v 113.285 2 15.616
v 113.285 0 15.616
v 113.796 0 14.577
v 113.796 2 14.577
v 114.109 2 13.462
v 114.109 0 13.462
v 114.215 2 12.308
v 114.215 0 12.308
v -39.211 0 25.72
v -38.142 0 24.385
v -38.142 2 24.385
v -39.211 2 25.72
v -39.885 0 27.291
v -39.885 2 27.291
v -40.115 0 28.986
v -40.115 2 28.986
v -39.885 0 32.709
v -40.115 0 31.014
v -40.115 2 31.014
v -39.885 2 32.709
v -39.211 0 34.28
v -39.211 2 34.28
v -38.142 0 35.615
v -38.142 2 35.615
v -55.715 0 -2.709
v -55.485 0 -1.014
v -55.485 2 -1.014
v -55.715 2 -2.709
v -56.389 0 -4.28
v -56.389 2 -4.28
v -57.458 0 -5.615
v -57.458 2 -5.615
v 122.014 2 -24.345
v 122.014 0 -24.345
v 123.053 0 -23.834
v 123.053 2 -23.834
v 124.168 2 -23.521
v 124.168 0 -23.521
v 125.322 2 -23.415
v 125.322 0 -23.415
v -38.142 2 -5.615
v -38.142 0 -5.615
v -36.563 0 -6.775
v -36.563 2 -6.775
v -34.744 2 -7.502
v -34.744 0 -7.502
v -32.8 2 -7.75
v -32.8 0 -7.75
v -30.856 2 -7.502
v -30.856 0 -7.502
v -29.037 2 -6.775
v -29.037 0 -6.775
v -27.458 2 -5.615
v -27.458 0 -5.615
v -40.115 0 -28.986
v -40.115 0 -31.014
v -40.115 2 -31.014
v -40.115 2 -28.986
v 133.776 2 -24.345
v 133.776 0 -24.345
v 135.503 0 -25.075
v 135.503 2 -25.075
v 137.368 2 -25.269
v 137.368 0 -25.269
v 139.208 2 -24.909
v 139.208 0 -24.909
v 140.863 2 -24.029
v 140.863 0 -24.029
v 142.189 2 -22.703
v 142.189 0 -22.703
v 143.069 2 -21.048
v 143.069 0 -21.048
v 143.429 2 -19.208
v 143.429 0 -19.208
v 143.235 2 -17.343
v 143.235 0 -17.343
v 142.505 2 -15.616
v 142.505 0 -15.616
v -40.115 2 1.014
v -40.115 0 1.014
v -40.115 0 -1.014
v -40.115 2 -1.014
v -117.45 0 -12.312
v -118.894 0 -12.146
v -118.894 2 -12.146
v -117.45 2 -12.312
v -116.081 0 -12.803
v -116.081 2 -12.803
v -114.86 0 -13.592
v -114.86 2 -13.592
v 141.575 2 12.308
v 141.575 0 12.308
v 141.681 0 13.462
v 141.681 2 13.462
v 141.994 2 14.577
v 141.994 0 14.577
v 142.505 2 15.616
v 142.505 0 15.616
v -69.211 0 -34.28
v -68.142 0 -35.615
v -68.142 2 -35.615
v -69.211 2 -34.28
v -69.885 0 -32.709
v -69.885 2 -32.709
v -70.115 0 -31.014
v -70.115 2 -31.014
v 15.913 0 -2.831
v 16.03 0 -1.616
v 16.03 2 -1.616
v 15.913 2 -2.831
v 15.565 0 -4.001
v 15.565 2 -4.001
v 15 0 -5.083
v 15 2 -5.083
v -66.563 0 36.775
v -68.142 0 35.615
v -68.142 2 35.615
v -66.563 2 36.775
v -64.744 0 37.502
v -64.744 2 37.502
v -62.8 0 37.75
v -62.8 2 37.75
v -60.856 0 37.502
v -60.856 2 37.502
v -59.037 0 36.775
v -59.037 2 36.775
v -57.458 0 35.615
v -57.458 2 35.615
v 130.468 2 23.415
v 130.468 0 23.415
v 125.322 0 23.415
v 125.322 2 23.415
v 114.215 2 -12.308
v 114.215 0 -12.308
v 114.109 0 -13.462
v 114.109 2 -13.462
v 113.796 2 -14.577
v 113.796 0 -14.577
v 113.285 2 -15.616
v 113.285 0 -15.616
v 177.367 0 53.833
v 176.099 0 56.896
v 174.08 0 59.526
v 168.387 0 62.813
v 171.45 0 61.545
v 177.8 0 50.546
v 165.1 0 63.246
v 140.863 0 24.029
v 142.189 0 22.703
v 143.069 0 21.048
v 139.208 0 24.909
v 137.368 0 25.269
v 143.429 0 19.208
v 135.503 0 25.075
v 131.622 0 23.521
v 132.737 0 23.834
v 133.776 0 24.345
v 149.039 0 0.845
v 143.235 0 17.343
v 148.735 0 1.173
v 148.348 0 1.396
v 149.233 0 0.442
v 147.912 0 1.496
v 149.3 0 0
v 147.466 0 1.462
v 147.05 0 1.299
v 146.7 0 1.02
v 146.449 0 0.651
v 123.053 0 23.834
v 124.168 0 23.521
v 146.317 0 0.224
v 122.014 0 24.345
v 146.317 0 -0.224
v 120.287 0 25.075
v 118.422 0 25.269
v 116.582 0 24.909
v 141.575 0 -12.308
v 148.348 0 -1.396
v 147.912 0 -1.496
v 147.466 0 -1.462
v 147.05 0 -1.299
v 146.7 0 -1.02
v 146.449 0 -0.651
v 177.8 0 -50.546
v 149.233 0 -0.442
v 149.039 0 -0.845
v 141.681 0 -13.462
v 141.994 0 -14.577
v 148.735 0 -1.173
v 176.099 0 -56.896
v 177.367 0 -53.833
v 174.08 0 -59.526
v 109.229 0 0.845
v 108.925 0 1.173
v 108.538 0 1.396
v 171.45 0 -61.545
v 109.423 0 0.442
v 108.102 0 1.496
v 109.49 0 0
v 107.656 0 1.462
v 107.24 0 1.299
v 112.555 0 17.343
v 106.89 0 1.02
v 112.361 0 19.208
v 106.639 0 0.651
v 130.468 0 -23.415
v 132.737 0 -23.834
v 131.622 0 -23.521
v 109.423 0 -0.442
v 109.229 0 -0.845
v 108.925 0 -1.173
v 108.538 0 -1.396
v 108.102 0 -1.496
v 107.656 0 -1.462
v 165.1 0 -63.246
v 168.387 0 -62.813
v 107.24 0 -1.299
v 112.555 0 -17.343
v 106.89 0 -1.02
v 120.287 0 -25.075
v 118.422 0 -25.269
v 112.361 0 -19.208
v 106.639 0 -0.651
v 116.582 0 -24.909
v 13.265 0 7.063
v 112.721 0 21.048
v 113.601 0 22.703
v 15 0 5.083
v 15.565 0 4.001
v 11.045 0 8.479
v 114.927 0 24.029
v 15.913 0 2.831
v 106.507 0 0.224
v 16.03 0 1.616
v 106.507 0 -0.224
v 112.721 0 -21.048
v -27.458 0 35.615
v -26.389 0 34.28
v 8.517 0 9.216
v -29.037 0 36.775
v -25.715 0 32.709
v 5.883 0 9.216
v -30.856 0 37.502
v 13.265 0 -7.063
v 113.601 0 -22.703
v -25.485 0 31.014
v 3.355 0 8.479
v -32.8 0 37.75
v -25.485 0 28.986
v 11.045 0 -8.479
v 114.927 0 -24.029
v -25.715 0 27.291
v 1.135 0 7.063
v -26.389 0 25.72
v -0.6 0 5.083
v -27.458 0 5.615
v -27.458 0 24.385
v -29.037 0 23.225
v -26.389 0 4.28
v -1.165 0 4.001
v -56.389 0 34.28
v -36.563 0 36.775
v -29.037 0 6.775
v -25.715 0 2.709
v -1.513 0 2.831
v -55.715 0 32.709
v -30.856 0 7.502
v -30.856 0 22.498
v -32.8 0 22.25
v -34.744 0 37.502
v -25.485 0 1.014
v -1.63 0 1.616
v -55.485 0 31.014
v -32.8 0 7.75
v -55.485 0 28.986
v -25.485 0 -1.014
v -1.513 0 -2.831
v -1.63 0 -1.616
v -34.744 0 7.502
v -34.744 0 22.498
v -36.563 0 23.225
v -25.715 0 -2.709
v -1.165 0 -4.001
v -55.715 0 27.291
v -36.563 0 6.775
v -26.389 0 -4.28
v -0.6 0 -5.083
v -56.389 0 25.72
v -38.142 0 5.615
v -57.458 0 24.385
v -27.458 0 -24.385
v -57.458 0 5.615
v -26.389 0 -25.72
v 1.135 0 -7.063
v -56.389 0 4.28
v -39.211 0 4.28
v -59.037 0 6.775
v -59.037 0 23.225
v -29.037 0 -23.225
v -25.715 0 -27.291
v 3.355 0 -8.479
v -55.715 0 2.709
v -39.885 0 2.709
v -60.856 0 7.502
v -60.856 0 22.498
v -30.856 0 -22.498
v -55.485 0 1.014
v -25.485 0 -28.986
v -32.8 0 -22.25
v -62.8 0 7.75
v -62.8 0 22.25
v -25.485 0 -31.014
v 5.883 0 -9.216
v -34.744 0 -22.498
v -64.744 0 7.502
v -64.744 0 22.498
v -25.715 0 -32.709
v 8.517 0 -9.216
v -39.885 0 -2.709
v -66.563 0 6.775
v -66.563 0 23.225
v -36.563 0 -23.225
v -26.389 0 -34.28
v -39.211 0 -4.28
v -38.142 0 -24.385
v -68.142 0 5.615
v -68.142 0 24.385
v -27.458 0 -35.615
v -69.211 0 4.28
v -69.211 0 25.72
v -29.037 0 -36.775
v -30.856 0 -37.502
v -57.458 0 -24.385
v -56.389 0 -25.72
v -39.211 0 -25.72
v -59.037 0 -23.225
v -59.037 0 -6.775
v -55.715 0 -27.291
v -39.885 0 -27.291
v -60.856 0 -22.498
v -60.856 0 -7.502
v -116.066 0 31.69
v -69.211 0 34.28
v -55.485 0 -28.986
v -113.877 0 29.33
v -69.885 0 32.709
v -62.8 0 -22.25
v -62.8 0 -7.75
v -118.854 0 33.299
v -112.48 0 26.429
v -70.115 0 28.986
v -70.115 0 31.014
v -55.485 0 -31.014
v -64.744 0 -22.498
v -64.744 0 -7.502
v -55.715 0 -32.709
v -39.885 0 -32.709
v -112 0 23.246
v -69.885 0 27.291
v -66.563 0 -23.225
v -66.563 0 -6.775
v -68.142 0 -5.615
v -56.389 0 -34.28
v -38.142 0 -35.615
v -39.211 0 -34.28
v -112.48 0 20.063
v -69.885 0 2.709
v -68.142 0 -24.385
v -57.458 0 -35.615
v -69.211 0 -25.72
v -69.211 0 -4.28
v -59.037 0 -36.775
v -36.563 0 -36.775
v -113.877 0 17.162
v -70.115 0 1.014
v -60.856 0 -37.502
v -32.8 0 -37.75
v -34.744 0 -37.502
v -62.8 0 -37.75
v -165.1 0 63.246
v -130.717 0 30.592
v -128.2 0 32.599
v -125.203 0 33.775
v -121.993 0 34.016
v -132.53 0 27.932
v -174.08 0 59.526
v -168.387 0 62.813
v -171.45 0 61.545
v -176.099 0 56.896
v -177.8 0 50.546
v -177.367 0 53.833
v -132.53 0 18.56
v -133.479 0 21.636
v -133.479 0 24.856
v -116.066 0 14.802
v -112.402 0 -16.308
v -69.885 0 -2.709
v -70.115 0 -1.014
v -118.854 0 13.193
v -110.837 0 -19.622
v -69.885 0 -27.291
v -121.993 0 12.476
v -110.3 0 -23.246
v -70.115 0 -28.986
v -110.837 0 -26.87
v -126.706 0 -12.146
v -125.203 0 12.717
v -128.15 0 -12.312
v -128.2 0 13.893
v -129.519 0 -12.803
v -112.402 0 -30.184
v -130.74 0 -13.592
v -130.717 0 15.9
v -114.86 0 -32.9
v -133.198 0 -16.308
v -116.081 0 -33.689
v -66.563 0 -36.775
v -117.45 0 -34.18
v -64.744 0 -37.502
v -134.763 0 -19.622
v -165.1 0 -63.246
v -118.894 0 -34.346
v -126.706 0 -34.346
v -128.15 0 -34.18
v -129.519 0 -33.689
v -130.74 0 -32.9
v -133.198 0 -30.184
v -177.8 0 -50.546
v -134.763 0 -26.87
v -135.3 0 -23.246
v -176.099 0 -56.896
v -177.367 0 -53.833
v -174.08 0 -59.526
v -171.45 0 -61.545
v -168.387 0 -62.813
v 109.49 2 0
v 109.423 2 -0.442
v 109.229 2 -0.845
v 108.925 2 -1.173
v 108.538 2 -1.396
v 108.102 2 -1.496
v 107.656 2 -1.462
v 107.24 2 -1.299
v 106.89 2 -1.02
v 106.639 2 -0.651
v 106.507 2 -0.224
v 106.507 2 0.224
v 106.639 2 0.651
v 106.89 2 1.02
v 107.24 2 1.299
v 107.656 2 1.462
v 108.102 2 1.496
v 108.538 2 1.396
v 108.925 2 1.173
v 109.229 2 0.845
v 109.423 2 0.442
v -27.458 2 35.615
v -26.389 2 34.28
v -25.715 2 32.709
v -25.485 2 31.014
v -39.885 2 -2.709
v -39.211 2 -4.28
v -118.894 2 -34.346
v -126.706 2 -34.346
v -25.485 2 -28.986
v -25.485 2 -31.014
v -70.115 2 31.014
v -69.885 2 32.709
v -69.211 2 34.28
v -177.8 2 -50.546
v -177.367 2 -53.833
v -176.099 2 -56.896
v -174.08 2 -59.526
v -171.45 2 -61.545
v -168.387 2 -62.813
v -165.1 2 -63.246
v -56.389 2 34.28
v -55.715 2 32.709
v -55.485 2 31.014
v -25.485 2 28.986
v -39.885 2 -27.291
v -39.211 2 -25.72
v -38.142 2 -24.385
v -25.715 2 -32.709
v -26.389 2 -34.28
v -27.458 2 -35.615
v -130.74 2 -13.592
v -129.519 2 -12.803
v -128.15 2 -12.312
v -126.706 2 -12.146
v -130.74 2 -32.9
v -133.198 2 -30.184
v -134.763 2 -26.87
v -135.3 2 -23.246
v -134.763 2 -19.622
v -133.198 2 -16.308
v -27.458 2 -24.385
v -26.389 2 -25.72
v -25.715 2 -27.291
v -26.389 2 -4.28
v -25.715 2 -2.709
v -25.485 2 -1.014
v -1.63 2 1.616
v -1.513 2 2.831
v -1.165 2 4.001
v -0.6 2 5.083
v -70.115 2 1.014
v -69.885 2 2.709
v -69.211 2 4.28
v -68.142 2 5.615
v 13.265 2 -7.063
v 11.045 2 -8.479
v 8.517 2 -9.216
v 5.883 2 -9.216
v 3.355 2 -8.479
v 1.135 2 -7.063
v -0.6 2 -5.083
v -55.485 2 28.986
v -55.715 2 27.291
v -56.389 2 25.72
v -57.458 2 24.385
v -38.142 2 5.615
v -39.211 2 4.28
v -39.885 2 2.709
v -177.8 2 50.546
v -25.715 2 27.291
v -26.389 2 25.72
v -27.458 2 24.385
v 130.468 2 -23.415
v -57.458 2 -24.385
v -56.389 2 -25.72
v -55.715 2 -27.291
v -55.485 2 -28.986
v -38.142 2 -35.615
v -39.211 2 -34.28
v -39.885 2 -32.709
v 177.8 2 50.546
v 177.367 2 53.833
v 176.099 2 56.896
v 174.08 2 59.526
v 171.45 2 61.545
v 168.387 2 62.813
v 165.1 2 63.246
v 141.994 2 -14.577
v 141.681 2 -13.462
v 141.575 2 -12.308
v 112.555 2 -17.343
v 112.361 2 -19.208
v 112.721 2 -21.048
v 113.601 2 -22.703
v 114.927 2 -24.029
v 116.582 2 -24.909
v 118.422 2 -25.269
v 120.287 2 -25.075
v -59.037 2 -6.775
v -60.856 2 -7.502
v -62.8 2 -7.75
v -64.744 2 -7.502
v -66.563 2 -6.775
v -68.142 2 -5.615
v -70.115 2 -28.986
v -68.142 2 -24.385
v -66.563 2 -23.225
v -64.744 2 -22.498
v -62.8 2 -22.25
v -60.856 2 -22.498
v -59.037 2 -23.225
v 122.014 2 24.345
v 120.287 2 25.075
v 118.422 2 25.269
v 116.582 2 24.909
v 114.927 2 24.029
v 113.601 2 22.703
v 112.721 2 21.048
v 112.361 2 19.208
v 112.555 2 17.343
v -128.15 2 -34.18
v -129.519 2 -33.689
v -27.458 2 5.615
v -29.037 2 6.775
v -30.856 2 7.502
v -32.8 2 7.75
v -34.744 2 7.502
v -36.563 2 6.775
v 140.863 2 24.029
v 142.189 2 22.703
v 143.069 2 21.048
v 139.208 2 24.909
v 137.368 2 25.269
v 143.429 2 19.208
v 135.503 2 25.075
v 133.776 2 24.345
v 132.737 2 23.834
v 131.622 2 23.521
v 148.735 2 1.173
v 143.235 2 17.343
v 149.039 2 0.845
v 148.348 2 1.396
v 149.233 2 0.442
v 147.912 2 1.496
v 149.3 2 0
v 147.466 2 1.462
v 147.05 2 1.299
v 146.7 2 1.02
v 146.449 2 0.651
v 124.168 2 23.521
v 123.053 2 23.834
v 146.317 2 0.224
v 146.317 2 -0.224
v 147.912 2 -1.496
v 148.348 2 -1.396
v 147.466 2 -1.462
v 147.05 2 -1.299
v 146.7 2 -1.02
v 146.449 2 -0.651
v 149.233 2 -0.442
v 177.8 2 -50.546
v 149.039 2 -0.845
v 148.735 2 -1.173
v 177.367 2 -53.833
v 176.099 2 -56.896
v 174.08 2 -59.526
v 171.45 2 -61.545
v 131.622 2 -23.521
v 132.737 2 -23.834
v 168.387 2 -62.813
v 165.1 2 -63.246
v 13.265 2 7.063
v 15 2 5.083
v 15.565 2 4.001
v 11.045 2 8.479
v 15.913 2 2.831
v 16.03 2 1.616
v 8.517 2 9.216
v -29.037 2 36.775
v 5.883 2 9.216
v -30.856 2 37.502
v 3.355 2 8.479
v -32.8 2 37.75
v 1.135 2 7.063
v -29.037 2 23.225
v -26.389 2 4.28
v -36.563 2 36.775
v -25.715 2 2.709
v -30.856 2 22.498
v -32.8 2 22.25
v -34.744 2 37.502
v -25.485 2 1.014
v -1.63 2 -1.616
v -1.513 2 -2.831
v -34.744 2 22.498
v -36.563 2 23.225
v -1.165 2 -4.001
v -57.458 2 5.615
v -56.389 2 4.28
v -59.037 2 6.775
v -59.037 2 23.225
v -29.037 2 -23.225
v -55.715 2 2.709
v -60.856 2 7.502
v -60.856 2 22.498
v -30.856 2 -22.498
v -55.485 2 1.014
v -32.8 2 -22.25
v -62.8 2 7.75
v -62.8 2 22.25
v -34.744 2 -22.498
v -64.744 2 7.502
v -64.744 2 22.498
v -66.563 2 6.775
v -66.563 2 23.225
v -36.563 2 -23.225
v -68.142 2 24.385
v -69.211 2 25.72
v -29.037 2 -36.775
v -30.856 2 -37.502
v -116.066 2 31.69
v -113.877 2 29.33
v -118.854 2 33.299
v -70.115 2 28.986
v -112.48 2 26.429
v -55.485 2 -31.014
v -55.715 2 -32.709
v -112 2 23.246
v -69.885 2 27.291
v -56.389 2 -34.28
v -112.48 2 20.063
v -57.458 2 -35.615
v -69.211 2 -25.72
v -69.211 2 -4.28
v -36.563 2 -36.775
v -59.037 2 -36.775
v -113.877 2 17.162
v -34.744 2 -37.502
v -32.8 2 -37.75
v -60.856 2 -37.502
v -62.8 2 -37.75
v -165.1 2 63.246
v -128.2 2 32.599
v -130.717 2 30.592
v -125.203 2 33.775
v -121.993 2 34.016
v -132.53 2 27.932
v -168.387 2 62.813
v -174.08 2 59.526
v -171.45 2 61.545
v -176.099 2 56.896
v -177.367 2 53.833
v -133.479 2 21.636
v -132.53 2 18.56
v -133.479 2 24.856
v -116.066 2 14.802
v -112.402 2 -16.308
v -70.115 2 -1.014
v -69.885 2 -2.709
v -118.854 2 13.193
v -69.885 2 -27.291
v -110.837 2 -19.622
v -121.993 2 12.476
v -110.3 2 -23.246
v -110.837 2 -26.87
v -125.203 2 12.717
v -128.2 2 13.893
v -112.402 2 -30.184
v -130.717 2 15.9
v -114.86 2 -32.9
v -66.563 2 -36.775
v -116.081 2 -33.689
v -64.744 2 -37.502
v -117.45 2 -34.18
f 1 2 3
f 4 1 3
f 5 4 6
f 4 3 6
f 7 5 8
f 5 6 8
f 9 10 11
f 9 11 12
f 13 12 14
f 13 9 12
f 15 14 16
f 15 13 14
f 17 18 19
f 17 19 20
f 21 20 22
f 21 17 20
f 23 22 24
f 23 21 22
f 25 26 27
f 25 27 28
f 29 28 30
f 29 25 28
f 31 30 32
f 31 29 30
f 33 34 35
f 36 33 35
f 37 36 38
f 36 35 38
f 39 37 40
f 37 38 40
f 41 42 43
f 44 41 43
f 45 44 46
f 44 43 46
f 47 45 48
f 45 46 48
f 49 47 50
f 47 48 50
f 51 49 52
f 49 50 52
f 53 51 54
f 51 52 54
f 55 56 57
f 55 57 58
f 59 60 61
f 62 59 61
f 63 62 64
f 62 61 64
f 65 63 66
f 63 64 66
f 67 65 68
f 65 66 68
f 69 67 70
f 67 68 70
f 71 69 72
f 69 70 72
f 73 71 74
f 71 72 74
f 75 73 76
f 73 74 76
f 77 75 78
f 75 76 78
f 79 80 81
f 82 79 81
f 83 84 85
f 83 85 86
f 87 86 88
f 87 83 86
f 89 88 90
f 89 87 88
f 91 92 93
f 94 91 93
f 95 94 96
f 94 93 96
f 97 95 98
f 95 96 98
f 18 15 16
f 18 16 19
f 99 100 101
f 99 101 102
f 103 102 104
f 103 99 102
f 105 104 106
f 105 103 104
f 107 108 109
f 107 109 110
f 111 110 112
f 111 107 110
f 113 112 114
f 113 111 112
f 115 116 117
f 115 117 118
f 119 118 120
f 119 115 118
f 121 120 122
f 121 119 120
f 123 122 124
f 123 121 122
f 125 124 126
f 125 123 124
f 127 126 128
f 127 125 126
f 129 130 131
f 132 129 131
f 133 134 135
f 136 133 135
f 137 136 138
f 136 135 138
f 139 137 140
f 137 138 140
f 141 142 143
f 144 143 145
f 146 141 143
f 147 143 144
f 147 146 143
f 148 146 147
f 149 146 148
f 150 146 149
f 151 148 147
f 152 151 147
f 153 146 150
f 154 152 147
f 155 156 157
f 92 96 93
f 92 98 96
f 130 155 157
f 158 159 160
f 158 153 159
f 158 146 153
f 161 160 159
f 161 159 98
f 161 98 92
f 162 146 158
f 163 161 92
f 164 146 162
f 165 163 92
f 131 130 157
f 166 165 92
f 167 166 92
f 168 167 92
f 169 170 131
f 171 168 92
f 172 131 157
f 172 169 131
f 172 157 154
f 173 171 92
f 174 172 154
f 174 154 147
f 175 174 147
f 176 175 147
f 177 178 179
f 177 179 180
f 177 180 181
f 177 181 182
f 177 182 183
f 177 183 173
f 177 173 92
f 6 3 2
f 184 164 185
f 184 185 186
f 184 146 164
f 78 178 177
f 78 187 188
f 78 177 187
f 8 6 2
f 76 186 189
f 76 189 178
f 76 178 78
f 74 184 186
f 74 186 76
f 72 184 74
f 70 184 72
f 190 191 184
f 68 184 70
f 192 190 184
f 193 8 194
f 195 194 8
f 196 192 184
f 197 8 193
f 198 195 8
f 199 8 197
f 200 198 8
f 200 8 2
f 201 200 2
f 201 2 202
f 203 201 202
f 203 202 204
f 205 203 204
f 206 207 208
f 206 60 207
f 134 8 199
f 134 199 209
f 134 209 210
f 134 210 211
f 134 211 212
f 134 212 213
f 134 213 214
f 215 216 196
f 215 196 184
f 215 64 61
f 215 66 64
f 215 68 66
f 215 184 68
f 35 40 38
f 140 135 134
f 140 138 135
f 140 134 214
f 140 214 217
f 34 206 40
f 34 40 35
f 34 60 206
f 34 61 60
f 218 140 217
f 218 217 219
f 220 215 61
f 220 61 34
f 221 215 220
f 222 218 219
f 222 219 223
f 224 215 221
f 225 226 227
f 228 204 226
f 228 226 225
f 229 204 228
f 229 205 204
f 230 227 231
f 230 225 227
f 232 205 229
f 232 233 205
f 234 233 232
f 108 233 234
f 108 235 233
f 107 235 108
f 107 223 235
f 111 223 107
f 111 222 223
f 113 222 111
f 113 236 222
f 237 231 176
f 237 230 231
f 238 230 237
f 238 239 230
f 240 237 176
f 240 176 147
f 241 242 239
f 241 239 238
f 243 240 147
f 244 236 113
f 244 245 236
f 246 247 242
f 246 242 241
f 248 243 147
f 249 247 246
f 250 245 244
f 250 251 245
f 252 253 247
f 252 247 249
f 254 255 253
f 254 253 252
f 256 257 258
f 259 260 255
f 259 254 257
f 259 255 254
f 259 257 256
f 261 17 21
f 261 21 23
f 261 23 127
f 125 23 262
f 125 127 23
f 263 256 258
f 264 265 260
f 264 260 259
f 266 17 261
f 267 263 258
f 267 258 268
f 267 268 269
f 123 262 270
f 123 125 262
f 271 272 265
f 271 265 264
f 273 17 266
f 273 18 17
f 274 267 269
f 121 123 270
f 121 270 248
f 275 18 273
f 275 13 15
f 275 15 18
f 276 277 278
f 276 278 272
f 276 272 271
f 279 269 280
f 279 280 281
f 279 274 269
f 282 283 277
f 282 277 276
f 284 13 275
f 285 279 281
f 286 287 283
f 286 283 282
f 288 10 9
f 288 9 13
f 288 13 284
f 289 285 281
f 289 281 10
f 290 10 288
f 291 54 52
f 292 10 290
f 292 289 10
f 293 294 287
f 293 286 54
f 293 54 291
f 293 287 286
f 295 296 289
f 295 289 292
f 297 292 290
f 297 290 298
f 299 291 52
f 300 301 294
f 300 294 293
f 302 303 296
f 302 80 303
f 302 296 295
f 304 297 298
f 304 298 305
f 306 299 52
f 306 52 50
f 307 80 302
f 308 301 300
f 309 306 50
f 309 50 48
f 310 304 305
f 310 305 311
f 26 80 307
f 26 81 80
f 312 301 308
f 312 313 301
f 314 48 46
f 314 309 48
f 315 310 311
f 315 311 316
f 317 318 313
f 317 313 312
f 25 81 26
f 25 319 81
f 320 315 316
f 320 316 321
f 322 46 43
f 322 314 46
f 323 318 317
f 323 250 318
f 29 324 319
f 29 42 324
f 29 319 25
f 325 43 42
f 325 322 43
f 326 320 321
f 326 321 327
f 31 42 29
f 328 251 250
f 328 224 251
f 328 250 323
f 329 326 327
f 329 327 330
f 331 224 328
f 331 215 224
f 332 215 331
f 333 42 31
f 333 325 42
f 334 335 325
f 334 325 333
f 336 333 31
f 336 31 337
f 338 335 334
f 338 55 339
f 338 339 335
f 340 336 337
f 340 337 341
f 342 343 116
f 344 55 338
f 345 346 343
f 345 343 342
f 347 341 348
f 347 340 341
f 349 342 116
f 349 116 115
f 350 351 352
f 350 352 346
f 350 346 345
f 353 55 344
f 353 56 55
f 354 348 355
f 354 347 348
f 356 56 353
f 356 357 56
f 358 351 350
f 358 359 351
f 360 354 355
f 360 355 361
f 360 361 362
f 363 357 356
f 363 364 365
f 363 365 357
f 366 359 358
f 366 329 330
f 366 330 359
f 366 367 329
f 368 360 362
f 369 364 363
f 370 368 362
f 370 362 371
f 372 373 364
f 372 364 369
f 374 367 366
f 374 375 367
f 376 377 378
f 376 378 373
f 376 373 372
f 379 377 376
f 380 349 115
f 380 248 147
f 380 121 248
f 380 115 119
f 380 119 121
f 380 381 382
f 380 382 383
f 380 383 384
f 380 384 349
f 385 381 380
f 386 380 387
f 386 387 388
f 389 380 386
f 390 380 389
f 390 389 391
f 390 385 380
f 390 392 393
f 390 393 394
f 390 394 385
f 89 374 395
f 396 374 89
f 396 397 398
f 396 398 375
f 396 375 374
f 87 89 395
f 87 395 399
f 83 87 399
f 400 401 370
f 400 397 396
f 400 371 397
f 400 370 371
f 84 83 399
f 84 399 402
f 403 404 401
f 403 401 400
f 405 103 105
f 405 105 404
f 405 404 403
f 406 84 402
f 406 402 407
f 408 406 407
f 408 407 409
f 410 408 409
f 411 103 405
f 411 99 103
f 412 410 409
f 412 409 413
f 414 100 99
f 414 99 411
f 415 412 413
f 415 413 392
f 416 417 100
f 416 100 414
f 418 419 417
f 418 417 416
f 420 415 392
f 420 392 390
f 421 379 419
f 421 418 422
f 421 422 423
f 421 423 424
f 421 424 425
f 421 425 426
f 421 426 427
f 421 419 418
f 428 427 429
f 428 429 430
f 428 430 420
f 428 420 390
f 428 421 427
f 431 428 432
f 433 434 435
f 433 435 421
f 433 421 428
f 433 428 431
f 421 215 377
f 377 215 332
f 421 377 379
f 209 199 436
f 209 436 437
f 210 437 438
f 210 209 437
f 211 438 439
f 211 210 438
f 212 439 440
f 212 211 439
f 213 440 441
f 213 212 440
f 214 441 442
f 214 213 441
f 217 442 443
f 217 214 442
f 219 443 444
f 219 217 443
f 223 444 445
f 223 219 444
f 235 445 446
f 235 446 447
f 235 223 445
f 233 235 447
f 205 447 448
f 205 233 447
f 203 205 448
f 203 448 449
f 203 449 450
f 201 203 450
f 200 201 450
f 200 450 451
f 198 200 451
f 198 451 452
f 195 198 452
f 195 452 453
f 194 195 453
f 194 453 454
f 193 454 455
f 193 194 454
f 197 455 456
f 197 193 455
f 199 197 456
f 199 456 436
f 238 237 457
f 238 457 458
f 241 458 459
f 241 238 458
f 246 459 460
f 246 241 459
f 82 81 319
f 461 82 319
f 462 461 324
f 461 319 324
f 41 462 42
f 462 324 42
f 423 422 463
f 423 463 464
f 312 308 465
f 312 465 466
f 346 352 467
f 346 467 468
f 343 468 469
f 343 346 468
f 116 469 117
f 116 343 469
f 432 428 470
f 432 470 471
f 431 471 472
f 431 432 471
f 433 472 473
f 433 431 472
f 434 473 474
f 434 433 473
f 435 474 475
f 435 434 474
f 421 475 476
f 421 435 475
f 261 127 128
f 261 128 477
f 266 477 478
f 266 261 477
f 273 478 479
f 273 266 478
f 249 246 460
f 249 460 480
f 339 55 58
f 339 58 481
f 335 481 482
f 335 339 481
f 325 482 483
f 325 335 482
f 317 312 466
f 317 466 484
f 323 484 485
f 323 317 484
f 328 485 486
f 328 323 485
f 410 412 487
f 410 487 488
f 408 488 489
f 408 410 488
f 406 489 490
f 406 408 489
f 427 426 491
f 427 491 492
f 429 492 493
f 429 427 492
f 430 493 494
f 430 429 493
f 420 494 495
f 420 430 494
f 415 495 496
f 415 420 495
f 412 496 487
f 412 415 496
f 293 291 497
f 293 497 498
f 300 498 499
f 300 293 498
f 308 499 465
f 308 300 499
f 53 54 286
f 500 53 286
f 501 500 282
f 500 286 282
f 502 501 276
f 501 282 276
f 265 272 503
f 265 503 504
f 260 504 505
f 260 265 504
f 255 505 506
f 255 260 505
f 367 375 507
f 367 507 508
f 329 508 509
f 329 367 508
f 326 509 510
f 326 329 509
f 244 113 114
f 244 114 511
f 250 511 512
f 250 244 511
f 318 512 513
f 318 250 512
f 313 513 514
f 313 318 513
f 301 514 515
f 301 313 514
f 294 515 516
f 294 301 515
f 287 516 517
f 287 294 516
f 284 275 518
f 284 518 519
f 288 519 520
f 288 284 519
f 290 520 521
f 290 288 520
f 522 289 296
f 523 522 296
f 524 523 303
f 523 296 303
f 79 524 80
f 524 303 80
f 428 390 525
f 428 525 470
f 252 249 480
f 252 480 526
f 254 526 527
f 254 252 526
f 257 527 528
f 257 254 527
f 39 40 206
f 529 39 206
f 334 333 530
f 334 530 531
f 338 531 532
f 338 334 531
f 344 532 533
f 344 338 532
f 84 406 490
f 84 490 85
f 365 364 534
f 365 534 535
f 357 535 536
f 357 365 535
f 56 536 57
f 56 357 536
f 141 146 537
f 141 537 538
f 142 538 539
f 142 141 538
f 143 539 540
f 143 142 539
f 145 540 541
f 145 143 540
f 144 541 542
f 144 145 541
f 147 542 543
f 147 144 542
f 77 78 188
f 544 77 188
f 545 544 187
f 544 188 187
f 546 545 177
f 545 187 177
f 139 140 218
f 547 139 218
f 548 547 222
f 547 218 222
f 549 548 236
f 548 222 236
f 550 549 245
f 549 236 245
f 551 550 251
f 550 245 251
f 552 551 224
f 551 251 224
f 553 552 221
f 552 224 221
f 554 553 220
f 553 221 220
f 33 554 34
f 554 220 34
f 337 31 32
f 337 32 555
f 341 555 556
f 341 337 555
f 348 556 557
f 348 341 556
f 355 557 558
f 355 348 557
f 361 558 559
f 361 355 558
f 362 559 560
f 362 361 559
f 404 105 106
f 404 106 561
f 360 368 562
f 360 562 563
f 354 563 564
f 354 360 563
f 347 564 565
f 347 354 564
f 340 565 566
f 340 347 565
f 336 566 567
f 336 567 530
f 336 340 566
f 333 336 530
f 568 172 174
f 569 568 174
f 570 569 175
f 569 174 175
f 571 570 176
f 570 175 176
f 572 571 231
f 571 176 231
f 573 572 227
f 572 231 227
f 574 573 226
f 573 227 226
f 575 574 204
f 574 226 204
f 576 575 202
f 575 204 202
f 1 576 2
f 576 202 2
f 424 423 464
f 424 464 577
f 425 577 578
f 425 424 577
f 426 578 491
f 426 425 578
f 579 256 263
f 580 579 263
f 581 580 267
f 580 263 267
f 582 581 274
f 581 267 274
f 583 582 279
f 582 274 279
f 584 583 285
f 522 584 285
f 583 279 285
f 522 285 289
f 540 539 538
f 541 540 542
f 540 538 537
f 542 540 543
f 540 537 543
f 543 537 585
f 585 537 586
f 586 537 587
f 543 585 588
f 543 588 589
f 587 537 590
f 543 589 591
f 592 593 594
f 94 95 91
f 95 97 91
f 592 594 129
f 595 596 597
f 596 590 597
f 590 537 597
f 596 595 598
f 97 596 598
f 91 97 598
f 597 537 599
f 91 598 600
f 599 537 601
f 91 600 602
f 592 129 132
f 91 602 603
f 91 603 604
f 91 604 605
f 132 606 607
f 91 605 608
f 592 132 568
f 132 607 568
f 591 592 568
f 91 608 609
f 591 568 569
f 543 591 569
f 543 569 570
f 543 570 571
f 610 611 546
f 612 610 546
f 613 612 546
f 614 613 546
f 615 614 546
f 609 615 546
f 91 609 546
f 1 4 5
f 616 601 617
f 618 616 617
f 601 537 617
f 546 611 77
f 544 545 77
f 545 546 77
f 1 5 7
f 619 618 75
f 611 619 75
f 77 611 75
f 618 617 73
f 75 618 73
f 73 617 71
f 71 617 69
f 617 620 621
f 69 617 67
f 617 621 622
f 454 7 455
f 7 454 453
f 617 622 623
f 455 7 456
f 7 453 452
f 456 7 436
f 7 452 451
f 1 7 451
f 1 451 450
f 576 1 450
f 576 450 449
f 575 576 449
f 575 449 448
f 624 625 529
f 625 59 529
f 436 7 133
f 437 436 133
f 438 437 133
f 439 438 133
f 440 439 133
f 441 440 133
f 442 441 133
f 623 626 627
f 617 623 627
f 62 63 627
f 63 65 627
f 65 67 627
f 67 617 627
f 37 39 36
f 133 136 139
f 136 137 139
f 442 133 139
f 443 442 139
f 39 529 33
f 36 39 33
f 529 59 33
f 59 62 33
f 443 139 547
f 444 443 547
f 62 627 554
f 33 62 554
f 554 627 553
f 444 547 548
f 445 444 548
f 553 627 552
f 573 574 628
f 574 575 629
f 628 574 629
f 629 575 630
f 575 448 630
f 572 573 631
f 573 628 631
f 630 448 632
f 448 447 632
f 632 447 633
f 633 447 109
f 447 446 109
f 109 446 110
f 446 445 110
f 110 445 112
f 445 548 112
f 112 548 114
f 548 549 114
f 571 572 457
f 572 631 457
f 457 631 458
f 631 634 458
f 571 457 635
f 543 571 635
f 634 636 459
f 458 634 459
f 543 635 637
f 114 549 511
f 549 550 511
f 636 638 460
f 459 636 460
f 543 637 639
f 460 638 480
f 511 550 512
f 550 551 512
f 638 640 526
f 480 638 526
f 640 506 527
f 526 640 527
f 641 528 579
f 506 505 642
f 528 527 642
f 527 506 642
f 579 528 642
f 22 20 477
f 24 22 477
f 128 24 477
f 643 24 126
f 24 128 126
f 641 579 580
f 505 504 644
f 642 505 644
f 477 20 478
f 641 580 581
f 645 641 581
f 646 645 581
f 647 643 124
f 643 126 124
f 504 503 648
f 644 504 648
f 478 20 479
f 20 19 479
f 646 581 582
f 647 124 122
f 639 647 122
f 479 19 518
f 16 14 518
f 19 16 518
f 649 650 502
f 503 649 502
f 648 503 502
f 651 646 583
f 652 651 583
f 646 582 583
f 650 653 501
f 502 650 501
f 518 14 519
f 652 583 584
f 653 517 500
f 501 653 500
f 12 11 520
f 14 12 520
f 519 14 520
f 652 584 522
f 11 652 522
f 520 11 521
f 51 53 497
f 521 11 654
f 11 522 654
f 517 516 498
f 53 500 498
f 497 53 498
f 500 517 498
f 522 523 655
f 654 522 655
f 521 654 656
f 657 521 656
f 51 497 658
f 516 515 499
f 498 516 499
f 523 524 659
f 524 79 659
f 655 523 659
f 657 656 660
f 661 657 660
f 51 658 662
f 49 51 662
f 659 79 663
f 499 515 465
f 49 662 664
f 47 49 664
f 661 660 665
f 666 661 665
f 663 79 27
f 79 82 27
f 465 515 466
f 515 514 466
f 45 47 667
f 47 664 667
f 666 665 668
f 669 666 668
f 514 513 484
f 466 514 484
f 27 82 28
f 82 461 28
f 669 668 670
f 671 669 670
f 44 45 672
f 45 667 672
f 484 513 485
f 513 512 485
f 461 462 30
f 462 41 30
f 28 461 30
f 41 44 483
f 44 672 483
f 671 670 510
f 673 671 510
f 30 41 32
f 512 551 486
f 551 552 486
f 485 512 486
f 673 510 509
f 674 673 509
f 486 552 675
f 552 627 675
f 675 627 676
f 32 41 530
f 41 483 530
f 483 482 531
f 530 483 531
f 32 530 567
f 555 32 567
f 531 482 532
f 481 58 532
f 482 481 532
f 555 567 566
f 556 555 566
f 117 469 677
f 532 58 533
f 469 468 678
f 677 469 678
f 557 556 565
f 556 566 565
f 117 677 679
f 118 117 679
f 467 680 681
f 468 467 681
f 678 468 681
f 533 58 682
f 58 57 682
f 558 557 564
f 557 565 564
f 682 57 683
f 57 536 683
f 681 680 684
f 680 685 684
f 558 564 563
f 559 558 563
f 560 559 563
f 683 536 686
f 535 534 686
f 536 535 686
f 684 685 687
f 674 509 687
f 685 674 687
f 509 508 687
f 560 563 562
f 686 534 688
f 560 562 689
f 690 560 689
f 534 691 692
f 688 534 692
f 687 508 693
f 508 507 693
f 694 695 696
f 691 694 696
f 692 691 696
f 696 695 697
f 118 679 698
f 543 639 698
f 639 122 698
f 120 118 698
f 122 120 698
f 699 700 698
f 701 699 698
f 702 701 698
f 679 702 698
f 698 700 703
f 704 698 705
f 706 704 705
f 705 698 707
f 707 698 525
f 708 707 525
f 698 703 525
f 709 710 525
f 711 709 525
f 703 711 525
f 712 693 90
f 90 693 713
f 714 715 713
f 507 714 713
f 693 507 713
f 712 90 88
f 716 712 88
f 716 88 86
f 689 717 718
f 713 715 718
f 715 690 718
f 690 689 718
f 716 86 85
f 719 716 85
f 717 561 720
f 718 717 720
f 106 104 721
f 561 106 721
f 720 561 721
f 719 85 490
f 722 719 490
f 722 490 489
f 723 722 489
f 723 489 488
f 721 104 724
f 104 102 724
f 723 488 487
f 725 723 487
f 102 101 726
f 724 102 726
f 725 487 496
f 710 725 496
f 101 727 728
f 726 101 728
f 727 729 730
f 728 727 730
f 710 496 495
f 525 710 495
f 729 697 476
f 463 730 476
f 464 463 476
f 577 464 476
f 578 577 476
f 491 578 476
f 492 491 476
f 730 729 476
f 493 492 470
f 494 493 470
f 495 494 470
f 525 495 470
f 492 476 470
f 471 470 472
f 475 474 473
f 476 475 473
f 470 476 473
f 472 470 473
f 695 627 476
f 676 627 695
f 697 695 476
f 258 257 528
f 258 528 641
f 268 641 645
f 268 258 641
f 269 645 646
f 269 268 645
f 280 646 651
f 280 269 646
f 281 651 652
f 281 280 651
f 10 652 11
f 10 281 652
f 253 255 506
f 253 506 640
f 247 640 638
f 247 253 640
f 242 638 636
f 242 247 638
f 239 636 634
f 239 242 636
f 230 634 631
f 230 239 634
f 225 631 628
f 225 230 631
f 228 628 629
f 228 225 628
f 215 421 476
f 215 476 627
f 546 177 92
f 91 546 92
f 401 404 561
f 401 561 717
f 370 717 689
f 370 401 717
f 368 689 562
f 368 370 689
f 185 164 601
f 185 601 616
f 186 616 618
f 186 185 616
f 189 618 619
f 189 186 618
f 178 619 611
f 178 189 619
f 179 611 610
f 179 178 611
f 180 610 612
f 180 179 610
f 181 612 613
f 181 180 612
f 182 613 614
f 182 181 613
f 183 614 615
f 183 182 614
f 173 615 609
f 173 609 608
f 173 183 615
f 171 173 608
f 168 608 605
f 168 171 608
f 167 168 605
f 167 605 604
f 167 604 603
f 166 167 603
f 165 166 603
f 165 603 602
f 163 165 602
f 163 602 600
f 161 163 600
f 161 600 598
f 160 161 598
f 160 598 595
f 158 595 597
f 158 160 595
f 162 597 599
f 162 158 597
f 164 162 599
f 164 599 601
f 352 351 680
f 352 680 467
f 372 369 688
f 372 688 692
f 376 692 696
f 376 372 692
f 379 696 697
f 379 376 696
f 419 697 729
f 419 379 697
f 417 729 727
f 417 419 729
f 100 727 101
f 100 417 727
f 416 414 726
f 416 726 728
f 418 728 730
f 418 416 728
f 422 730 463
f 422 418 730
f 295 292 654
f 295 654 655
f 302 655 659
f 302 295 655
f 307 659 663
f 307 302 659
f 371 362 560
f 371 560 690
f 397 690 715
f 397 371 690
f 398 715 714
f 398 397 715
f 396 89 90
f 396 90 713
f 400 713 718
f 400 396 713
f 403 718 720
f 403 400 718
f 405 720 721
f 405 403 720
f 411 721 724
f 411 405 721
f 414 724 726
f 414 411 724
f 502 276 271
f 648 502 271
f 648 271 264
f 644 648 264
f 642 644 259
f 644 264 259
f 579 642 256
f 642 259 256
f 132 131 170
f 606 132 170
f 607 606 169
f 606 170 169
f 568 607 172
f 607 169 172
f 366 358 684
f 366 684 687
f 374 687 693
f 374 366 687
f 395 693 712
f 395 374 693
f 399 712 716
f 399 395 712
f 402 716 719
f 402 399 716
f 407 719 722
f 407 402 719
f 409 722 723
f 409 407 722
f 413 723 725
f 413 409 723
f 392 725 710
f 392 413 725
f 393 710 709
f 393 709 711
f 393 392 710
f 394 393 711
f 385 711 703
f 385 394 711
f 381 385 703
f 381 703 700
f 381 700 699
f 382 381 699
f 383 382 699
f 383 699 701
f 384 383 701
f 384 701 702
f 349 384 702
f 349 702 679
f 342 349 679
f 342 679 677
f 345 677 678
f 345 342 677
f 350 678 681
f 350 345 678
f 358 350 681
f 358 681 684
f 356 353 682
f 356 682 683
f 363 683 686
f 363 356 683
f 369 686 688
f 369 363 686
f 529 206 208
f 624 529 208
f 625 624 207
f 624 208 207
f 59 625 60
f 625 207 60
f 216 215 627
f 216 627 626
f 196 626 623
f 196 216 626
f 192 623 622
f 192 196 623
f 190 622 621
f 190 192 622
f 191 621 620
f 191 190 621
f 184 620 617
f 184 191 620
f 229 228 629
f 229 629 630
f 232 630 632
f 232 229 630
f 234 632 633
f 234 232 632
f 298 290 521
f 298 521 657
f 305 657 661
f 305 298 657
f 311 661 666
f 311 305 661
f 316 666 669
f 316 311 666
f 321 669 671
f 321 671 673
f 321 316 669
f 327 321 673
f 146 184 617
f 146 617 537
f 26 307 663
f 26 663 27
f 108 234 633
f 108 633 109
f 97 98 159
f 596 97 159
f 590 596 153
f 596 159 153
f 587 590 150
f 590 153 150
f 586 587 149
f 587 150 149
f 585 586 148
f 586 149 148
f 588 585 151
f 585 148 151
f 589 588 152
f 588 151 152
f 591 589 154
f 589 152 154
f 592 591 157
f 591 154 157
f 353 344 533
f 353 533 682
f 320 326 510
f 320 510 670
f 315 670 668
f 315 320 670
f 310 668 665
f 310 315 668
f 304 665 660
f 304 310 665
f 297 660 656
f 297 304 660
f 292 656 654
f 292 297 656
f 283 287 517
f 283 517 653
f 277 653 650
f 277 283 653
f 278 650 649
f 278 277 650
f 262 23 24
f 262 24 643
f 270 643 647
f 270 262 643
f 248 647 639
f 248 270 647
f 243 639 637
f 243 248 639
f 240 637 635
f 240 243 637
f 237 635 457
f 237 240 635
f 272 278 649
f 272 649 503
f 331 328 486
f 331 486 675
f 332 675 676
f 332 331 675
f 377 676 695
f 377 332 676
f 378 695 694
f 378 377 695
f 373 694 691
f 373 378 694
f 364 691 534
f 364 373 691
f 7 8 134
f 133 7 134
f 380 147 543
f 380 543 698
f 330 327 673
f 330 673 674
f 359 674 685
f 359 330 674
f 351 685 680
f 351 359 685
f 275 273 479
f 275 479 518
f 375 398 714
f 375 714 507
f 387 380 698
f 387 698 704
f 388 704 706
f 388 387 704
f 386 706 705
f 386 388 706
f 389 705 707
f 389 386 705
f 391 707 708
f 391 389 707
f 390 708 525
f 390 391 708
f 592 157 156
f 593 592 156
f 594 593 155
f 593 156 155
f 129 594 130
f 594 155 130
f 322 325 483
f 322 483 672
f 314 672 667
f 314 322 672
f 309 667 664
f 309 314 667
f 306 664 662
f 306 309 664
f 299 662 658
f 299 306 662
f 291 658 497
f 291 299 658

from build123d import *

# Parameters (mm, degrees)
SKETCH1_R           = 10.8
SKETCH1_R_2         = 1.5
BOSS_EXTRUDE1_DEPTH = 2


with BuildPart() as part:
    # Sketch1 → Boss-Extrude1 (new body)
    with BuildSketch(Plane(origin=(0, 0, 0), x_dir=(1, 0, 0), z_dir=(0, 1, 0))):
        with BuildLine():
            Line((-165.1, 63.246), (165.1, 63.246))
            ThreePointArc((165.1, 63.246), (174.080256121, 59.526256121), (177.8, 50.546))
            Line((177.8, 50.546), (177.8, -50.546))
            ThreePointArc((177.8, -50.546), (174.080256121, -59.526256121), (165.1, -63.246))
            Line((165.1, -63.246), (-165.1, -63.246))
            ThreePointArc((-165.1, -63.246), (-174.080256121, -59.526256121), (-177.8, -50.546))
            Line((-177.8, -50.546), (-177.8, 50.546))
            ThreePointArc((-177.8, 50.546), (-174.080256121, 59.526256121), (-165.1, 63.246))
        make_face()
        with Locations((-122.8, -23.246)):
            Circle(SKETCH1_R, mode=Mode.SUBTRACT)
        with Locations((107.99, 0)):
            Circle(SKETCH1_R_2, mode=Mode.SUBTRACT)
        with Locations((147.8, 0)):
            Circle(SKETCH1_R_2, mode=Mode.SUBTRACT)
        with BuildLine():
            Line((-118.893595003, 34.346), (-126.706404997, 34.346))
            ThreePointArc((-126.706404997, 34.346), (-128.848729166, 33.973704171), (-130.739847555, 32.900471545))
            ThreePointArc((-130.739847555, 32.900471545), (-135.3, 23.246), (-130.739847555, 13.591528455))
            ThreePointArc((-130.739847555, 13.591528455), (-128.848729166, 12.518295829), (-126.706404997, 12.146))
            Line((-126.706404997, 12.146), (-118.893595003, 12.146))
            ThreePointArc((-118.893595003, 12.146), (-116.751270834, 12.518295829), (-114.860152445, 13.591528455))
            ThreePointArc((-114.860152445, 13.591528455), (-110.3, 23.246), (-114.860152445, 32.900471545))
            ThreePointArc((-114.860152445, 32.900471545), (-116.751270834, 33.973704171), (-118.893595003, 34.346))
        make_face(mode=Mode.SUBTRACT)
        with BuildLine():
            Line((-70.115, 31.014285463), (-70.115, 28.985714537))
            ThreePointArc((-70.115, 28.985714537), (-69.600932797, 26.482838513), (-68.141964286, 24.385205474))
            ThreePointArc((-68.141964286, 24.385205474), (-62.8, 22.25), (-57.458035714, 24.385205474))
            ThreePointArc((-57.458035714, 24.385205474), (-55.999067203, 26.482838513), (-55.485, 28.985714537))
            Line((-55.485, 28.985714537), (-55.485, 31.014285463))
            ThreePointArc((-55.485, 31.014285463), (-55.999067203, 33.517161487), (-57.458035714, 35.614794526))
            ThreePointArc((-57.458035714, 35.614794526), (-62.8, 37.75), (-68.141964286, 35.614794526))
            ThreePointArc((-68.141964286, 35.614794526), (-69.600932797, 33.517161487), (-70.115, 31.014285463))
        make_face(mode=Mode.SUBTRACT)
        with BuildLine():
            Line((-40.115, 31.014285463), (-40.115, 28.985714537))
            ThreePointArc((-40.115, 28.985714537), (-39.600932797, 26.482838513), (-38.141964286, 24.385205474))
            ThreePointArc((-38.141964286, 24.385205474), (-32.8, 22.25), (-27.458035714, 24.385205474))
            ThreePointArc((-27.458035714, 24.385205474), (-25.999067203, 26.482838513), (-25.485, 28.985714537))
            Line((-25.485, 28.985714537), (-25.485, 31.014285463))
            ThreePointArc((-25.485, 31.014285463), (-25.999067203, 33.517161487), (-27.458035714, 35.614794526))
            ThreePointArc((-27.458035714, 35.614794526), (-32.8, 37.75), (-38.141964286, 35.614794526))
            ThreePointArc((-38.141964286, 35.614794526), (-39.600932797, 33.517161487), (-40.115, 31.014285463))
        make_face(mode=Mode.SUBTRACT)
        with BuildLine():
            Line((-70.115, 1.014285463), (-70.115, -1.014285463))
            ThreePointArc((-70.115, -1.014285463), (-69.600932797, -3.517161487), (-68.141964286, -5.614794526))
            ThreePointArc((-68.141964286, -5.614794526), (-62.8, -7.75), (-57.458035714, -5.614794526))
            ThreePointArc((-57.458035714, -5.614794526), (-55.999067203, -3.517161487), (-55.485, -1.014285463))
            Line((-55.485, -1.014285463), (-55.485, 1.014285463))
            ThreePointArc((-55.485, 1.014285463), (-55.999067203, 3.517161487), (-57.458035714, 5.614794526))
            ThreePointArc((-57.458035714, 5.614794526), (-62.8, 7.75), (-68.141964286, 5.614794526))
            ThreePointArc((-68.141964286, 5.614794526), (-69.600932797, 3.517161487), (-70.115, 1.014285463))
        make_face(mode=Mode.SUBTRACT)
        with BuildLine():
            Line((-70.115, -28.985714537), (-70.115, -31.014285463))
            ThreePointArc((-70.115, -31.014285463), (-69.600932797, -33.517161487), (-68.141964286, -35.614794526))
            ThreePointArc((-68.141964286, -35.614794526), (-62.8, -37.75), (-57.458035714, -35.614794526))
            ThreePointArc((-57.458035714, -35.614794526), (-55.999067203, -33.517161487), (-55.485, -31.014285463))
            Line((-55.485, -31.014285463), (-55.485, -28.985714537))
            ThreePointArc((-55.485, -28.985714537), (-55.999067203, -26.482838513), (-57.458035714, -24.385205474))
            ThreePointArc((-57.458035714, -24.385205474), (-62.8, -22.25), (-68.141964286, -24.385205474))
            ThreePointArc((-68.141964286, -24.385205474), (-69.600932797, -26.482838513), (-70.115, -28.985714537))
        make_face(mode=Mode.SUBTRACT)
        with BuildLine():
            Line((-40.115, -28.985714537), (-40.115, -31.014285463))
            ThreePointArc((-40.115, -31.014285463), (-39.600932797, -33.517161487), (-38.141964286, -35.614794526))
            ThreePointArc((-38.141964286, -35.614794526), (-32.8, -37.75), (-27.458035714, -35.614794526))
            ThreePointArc((-27.458035714, -35.614794526), (-25.999067203, -33.517161487), (-25.485, -31.014285463))
            Line((-25.485, -31.014285463), (-25.485, -28.985714537))
            ThreePointArc((-25.485, -28.985714537), (-25.999067203, -26.482838513), (-27.458035714, -24.385205474))
            ThreePointArc((-27.458035714, -24.385205474), (-32.8, -22.25), (-38.141964286, -24.385205474))
            ThreePointArc((-38.141964286, -24.385205474), (-39.600932797, -26.482838513), (-40.115, -28.985714537))
        make_face(mode=Mode.SUBTRACT)
        with BuildLine():
            Line((-25.485, 1.014285463), (-25.485, -1.014285463))
            ThreePointArc((-25.485, -1.014285463), (-25.999067203, -3.517161487), (-27.458035714, -5.614794526))
            ThreePointArc((-27.458035714, -5.614794526), (-32.8, -7.75), (-38.141964286, -5.614794526))
            ThreePointArc((-38.141964286, -5.614794526), (-39.600932797, -3.517161487), (-40.115, -1.014285463))
            Line((-40.115, -1.014285463), (-40.115, 1.014285463))
            ThreePointArc((-40.115, 1.014285463), (-39.600932797, 3.517161487), (-38.141964286, 5.614794526))
            ThreePointArc((-38.141964286, 5.614794526), (-32.8, 7.75), (-27.458035714, 5.614794526))
            ThreePointArc((-27.458035714, 5.614794526), (-25.999067203, 3.517161487), (-25.485, 1.014285463))
        make_face(mode=Mode.SUBTRACT)
        with BuildLine():
            Line((-1.63, 1.61592079), (-1.63, -1.61592079))
            ThreePointArc((-1.63, -1.61592079), (-1.367126425, -3.424066772), (-0.60027027, -5.08250762))
            ThreePointArc((-0.60027027, -5.08250762), (7.2, -9.31), (15.00027027, -5.08250762))
            ThreePointArc((15.00027027, -5.08250762), (15.767126425, -3.424066772), (16.03, -1.61592079))
            Line((16.03, -1.61592079), (16.03, 1.61592079))
            ThreePointArc((16.03, 1.61592079), (15.767126425, 3.424066772), (15.00027027, 5.08250762))
            ThreePointArc((15.00027027, 5.08250762), (7.2, 9.31), (-0.60027027, 5.08250762))
            ThreePointArc((-0.60027027, 5.08250762), (-1.367126425, 3.424066772), (-1.63, 1.61592079))
        make_face(mode=Mode.SUBTRACT)
        with BuildLine():
            Line((125.321896428, 23.415), (130.468103572, 23.415))
            ThreePointArc((130.468103572, 23.415), (132.18640119, 23.651903134), (133.776487756, 24.34493597))
            ThreePointArc((133.776487756, 24.34493597), (141.575, 23.415), (142.50493597, 15.616487756))
            ThreePointArc((142.50493597, 15.616487756), (141.811903134, 14.02640119), (141.575, 12.308103572))
            Line((141.575, 12.308103572), (141.575, -12.308103572))
            ThreePointArc((141.575, -12.308103572), (141.811903134, -14.02640119), (142.50493597, -15.616487756))
            ThreePointArc((142.50493597, -15.616487756), (141.575, -23.415), (133.776487756, -24.34493597))
            ThreePointArc((133.776487756, -24.34493597), (132.18640119, -23.651903134), (130.468103572, -23.415))
            Line((130.468103572, -23.415), (125.321896428, -23.415))
            ThreePointArc((125.321896428, -23.415), (123.60359881, -23.651903134), (122.013512244, -24.34493597))
            ThreePointArc((122.013512244, -24.34493597), (114.215, -23.415), (113.28506403, -15.616487756))
            ThreePointArc((113.28506403, -15.616487756), (113.978096866, -14.02640119), (114.215, -12.308103572))
            Line((114.215, -12.308103572), (114.215, 12.308103572))
            ThreePointArc((114.215, 12.308103572), (113.978096866, 14.02640119), (113.28506403, 15.616487756))
            ThreePointArc((113.28506403, 15.616487756), (114.215, 23.415), (122.013512244, 24.34493597))
            ThreePointArc((122.013512244, 24.34493597), (123.60359881, 23.651903134), (125.321896428, 23.415))
        make_face(mode=Mode.SUBTRACT)
    extrude(amount=BOSS_EXTRUDE1_DEPTH)


solid = part.part
